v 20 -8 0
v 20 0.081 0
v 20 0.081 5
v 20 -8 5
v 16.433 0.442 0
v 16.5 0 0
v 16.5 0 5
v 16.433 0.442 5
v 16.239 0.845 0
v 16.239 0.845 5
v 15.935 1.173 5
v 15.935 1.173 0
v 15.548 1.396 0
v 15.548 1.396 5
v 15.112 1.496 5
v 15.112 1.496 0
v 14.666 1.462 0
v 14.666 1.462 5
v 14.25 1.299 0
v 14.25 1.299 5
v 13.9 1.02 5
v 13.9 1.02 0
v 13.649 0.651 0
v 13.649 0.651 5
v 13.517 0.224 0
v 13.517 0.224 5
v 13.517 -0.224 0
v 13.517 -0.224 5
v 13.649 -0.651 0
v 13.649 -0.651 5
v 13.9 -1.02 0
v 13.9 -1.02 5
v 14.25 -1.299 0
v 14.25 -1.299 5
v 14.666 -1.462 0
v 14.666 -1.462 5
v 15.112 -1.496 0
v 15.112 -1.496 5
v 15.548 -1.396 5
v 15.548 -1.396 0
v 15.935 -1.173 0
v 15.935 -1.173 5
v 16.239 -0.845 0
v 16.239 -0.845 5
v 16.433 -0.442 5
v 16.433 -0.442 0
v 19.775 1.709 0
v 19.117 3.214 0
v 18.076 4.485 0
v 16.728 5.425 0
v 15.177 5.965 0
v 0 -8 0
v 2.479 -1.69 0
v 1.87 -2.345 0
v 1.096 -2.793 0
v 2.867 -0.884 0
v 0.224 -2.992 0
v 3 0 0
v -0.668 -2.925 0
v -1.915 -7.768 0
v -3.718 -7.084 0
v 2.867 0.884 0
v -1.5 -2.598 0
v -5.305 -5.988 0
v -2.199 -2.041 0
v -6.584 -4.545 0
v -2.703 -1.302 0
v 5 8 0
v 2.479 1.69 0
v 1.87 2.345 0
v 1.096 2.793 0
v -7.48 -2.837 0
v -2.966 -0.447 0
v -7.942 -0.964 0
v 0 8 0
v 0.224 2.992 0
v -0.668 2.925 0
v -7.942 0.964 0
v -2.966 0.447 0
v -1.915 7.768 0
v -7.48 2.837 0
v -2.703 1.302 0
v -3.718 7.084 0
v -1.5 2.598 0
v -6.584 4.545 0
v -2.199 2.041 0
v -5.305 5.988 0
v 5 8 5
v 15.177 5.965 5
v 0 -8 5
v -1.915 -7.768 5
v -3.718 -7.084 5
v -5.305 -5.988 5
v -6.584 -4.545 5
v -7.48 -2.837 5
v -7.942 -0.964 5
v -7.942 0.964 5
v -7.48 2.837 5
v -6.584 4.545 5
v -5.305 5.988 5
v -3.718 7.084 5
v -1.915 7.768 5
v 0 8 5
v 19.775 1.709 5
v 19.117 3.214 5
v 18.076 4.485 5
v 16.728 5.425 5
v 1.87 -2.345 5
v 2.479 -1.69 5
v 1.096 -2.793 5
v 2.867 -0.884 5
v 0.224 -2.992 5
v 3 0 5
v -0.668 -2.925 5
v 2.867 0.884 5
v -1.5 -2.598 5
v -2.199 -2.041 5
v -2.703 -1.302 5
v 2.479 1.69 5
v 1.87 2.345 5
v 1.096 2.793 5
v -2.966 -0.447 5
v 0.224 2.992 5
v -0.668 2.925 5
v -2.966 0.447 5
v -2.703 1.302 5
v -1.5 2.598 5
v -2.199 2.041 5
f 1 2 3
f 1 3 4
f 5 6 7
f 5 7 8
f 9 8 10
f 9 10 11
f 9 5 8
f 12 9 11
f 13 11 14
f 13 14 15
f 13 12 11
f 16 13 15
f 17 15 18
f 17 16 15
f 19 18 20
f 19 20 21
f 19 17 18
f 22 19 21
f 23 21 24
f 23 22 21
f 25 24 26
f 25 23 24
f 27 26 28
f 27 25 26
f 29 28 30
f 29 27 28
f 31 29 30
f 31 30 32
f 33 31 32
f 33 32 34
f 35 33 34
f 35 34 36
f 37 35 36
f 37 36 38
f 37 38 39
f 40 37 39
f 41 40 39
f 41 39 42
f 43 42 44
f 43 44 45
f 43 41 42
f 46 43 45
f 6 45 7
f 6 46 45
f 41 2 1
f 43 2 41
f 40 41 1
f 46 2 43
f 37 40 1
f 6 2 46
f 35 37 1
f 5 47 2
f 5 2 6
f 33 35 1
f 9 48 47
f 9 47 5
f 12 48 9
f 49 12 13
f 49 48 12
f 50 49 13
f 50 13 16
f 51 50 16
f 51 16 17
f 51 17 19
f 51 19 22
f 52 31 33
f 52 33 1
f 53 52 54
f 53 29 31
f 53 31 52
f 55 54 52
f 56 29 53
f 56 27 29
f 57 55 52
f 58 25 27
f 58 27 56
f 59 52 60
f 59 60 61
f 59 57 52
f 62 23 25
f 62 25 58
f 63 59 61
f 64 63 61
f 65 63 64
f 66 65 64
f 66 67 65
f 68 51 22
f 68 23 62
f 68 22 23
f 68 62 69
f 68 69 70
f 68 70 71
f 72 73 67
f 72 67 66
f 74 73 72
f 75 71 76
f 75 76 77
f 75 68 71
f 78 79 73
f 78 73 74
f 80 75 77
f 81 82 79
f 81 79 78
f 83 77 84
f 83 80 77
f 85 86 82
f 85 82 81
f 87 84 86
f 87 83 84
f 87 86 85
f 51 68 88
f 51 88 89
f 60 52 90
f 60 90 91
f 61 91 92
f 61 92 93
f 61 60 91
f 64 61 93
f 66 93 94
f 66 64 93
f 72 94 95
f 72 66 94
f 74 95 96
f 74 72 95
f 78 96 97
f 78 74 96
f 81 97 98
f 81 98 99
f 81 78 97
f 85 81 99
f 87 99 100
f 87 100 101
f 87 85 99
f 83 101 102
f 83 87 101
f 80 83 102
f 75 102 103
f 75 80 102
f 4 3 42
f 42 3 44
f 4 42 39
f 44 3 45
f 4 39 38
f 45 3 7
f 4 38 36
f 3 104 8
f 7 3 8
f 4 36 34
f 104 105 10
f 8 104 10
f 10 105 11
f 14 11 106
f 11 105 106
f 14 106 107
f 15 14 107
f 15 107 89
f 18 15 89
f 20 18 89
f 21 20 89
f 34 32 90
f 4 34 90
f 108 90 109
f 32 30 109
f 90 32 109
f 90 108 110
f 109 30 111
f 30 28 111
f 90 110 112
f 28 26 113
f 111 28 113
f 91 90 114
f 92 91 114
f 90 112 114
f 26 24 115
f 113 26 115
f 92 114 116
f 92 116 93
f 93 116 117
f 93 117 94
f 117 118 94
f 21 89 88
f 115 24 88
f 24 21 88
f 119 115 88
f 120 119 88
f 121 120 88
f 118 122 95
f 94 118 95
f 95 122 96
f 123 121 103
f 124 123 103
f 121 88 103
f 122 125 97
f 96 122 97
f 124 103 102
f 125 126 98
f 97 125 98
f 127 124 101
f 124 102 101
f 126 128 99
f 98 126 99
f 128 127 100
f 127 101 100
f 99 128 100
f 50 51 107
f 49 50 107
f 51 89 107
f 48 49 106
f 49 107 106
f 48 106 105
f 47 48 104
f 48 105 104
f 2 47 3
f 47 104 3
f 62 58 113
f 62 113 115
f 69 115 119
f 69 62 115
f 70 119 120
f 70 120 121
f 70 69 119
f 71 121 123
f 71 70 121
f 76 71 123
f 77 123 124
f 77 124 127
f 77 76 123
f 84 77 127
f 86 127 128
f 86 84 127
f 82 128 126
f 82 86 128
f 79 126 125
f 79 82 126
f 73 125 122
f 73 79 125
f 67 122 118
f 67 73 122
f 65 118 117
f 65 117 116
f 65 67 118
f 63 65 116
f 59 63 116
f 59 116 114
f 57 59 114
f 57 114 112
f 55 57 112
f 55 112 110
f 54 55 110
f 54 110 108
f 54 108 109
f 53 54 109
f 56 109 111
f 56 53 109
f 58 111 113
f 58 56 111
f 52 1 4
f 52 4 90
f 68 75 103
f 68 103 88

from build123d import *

# Parameters (mm, degrees)
ESQUISSE1_R        = 3
ESQUISSE1_R_2      = 1.5
BOSS_EXTRU_1_DEPTH = 5
CONG_1_R           = 6


with BuildPart() as part:
    # Esquisse1 → Boss.-Extru.1 (new body)
    with BuildSketch(Plane.XY):
        with BuildLine():
            Line((0, 8), (5, 8))
            Line((5, 8), (20, 5))
            Line((20, 5), (20, -8))
            Line((20, -8), (0, -8))
            ThreePointArc((0, -8), (-8, 0), (0, 8))
        make_face()
        Circle(ESQUISSE1_R, mode=Mode.SUBTRACT)
        with Locations((15, 0)):
            Circle(ESQUISSE1_R_2, mode=Mode.SUBTRACT)
    extrude(amount=BOSS_EXTRU_1_DEPTH)

    # Congé1
    cong_1_edges = [part.edges().sort_by_distance(p)[0] for p in [
        (20, 5, 2.5),
    ]]
    fillet(cong_1_edges, radius=CONG_1_R)


solid = part.part
